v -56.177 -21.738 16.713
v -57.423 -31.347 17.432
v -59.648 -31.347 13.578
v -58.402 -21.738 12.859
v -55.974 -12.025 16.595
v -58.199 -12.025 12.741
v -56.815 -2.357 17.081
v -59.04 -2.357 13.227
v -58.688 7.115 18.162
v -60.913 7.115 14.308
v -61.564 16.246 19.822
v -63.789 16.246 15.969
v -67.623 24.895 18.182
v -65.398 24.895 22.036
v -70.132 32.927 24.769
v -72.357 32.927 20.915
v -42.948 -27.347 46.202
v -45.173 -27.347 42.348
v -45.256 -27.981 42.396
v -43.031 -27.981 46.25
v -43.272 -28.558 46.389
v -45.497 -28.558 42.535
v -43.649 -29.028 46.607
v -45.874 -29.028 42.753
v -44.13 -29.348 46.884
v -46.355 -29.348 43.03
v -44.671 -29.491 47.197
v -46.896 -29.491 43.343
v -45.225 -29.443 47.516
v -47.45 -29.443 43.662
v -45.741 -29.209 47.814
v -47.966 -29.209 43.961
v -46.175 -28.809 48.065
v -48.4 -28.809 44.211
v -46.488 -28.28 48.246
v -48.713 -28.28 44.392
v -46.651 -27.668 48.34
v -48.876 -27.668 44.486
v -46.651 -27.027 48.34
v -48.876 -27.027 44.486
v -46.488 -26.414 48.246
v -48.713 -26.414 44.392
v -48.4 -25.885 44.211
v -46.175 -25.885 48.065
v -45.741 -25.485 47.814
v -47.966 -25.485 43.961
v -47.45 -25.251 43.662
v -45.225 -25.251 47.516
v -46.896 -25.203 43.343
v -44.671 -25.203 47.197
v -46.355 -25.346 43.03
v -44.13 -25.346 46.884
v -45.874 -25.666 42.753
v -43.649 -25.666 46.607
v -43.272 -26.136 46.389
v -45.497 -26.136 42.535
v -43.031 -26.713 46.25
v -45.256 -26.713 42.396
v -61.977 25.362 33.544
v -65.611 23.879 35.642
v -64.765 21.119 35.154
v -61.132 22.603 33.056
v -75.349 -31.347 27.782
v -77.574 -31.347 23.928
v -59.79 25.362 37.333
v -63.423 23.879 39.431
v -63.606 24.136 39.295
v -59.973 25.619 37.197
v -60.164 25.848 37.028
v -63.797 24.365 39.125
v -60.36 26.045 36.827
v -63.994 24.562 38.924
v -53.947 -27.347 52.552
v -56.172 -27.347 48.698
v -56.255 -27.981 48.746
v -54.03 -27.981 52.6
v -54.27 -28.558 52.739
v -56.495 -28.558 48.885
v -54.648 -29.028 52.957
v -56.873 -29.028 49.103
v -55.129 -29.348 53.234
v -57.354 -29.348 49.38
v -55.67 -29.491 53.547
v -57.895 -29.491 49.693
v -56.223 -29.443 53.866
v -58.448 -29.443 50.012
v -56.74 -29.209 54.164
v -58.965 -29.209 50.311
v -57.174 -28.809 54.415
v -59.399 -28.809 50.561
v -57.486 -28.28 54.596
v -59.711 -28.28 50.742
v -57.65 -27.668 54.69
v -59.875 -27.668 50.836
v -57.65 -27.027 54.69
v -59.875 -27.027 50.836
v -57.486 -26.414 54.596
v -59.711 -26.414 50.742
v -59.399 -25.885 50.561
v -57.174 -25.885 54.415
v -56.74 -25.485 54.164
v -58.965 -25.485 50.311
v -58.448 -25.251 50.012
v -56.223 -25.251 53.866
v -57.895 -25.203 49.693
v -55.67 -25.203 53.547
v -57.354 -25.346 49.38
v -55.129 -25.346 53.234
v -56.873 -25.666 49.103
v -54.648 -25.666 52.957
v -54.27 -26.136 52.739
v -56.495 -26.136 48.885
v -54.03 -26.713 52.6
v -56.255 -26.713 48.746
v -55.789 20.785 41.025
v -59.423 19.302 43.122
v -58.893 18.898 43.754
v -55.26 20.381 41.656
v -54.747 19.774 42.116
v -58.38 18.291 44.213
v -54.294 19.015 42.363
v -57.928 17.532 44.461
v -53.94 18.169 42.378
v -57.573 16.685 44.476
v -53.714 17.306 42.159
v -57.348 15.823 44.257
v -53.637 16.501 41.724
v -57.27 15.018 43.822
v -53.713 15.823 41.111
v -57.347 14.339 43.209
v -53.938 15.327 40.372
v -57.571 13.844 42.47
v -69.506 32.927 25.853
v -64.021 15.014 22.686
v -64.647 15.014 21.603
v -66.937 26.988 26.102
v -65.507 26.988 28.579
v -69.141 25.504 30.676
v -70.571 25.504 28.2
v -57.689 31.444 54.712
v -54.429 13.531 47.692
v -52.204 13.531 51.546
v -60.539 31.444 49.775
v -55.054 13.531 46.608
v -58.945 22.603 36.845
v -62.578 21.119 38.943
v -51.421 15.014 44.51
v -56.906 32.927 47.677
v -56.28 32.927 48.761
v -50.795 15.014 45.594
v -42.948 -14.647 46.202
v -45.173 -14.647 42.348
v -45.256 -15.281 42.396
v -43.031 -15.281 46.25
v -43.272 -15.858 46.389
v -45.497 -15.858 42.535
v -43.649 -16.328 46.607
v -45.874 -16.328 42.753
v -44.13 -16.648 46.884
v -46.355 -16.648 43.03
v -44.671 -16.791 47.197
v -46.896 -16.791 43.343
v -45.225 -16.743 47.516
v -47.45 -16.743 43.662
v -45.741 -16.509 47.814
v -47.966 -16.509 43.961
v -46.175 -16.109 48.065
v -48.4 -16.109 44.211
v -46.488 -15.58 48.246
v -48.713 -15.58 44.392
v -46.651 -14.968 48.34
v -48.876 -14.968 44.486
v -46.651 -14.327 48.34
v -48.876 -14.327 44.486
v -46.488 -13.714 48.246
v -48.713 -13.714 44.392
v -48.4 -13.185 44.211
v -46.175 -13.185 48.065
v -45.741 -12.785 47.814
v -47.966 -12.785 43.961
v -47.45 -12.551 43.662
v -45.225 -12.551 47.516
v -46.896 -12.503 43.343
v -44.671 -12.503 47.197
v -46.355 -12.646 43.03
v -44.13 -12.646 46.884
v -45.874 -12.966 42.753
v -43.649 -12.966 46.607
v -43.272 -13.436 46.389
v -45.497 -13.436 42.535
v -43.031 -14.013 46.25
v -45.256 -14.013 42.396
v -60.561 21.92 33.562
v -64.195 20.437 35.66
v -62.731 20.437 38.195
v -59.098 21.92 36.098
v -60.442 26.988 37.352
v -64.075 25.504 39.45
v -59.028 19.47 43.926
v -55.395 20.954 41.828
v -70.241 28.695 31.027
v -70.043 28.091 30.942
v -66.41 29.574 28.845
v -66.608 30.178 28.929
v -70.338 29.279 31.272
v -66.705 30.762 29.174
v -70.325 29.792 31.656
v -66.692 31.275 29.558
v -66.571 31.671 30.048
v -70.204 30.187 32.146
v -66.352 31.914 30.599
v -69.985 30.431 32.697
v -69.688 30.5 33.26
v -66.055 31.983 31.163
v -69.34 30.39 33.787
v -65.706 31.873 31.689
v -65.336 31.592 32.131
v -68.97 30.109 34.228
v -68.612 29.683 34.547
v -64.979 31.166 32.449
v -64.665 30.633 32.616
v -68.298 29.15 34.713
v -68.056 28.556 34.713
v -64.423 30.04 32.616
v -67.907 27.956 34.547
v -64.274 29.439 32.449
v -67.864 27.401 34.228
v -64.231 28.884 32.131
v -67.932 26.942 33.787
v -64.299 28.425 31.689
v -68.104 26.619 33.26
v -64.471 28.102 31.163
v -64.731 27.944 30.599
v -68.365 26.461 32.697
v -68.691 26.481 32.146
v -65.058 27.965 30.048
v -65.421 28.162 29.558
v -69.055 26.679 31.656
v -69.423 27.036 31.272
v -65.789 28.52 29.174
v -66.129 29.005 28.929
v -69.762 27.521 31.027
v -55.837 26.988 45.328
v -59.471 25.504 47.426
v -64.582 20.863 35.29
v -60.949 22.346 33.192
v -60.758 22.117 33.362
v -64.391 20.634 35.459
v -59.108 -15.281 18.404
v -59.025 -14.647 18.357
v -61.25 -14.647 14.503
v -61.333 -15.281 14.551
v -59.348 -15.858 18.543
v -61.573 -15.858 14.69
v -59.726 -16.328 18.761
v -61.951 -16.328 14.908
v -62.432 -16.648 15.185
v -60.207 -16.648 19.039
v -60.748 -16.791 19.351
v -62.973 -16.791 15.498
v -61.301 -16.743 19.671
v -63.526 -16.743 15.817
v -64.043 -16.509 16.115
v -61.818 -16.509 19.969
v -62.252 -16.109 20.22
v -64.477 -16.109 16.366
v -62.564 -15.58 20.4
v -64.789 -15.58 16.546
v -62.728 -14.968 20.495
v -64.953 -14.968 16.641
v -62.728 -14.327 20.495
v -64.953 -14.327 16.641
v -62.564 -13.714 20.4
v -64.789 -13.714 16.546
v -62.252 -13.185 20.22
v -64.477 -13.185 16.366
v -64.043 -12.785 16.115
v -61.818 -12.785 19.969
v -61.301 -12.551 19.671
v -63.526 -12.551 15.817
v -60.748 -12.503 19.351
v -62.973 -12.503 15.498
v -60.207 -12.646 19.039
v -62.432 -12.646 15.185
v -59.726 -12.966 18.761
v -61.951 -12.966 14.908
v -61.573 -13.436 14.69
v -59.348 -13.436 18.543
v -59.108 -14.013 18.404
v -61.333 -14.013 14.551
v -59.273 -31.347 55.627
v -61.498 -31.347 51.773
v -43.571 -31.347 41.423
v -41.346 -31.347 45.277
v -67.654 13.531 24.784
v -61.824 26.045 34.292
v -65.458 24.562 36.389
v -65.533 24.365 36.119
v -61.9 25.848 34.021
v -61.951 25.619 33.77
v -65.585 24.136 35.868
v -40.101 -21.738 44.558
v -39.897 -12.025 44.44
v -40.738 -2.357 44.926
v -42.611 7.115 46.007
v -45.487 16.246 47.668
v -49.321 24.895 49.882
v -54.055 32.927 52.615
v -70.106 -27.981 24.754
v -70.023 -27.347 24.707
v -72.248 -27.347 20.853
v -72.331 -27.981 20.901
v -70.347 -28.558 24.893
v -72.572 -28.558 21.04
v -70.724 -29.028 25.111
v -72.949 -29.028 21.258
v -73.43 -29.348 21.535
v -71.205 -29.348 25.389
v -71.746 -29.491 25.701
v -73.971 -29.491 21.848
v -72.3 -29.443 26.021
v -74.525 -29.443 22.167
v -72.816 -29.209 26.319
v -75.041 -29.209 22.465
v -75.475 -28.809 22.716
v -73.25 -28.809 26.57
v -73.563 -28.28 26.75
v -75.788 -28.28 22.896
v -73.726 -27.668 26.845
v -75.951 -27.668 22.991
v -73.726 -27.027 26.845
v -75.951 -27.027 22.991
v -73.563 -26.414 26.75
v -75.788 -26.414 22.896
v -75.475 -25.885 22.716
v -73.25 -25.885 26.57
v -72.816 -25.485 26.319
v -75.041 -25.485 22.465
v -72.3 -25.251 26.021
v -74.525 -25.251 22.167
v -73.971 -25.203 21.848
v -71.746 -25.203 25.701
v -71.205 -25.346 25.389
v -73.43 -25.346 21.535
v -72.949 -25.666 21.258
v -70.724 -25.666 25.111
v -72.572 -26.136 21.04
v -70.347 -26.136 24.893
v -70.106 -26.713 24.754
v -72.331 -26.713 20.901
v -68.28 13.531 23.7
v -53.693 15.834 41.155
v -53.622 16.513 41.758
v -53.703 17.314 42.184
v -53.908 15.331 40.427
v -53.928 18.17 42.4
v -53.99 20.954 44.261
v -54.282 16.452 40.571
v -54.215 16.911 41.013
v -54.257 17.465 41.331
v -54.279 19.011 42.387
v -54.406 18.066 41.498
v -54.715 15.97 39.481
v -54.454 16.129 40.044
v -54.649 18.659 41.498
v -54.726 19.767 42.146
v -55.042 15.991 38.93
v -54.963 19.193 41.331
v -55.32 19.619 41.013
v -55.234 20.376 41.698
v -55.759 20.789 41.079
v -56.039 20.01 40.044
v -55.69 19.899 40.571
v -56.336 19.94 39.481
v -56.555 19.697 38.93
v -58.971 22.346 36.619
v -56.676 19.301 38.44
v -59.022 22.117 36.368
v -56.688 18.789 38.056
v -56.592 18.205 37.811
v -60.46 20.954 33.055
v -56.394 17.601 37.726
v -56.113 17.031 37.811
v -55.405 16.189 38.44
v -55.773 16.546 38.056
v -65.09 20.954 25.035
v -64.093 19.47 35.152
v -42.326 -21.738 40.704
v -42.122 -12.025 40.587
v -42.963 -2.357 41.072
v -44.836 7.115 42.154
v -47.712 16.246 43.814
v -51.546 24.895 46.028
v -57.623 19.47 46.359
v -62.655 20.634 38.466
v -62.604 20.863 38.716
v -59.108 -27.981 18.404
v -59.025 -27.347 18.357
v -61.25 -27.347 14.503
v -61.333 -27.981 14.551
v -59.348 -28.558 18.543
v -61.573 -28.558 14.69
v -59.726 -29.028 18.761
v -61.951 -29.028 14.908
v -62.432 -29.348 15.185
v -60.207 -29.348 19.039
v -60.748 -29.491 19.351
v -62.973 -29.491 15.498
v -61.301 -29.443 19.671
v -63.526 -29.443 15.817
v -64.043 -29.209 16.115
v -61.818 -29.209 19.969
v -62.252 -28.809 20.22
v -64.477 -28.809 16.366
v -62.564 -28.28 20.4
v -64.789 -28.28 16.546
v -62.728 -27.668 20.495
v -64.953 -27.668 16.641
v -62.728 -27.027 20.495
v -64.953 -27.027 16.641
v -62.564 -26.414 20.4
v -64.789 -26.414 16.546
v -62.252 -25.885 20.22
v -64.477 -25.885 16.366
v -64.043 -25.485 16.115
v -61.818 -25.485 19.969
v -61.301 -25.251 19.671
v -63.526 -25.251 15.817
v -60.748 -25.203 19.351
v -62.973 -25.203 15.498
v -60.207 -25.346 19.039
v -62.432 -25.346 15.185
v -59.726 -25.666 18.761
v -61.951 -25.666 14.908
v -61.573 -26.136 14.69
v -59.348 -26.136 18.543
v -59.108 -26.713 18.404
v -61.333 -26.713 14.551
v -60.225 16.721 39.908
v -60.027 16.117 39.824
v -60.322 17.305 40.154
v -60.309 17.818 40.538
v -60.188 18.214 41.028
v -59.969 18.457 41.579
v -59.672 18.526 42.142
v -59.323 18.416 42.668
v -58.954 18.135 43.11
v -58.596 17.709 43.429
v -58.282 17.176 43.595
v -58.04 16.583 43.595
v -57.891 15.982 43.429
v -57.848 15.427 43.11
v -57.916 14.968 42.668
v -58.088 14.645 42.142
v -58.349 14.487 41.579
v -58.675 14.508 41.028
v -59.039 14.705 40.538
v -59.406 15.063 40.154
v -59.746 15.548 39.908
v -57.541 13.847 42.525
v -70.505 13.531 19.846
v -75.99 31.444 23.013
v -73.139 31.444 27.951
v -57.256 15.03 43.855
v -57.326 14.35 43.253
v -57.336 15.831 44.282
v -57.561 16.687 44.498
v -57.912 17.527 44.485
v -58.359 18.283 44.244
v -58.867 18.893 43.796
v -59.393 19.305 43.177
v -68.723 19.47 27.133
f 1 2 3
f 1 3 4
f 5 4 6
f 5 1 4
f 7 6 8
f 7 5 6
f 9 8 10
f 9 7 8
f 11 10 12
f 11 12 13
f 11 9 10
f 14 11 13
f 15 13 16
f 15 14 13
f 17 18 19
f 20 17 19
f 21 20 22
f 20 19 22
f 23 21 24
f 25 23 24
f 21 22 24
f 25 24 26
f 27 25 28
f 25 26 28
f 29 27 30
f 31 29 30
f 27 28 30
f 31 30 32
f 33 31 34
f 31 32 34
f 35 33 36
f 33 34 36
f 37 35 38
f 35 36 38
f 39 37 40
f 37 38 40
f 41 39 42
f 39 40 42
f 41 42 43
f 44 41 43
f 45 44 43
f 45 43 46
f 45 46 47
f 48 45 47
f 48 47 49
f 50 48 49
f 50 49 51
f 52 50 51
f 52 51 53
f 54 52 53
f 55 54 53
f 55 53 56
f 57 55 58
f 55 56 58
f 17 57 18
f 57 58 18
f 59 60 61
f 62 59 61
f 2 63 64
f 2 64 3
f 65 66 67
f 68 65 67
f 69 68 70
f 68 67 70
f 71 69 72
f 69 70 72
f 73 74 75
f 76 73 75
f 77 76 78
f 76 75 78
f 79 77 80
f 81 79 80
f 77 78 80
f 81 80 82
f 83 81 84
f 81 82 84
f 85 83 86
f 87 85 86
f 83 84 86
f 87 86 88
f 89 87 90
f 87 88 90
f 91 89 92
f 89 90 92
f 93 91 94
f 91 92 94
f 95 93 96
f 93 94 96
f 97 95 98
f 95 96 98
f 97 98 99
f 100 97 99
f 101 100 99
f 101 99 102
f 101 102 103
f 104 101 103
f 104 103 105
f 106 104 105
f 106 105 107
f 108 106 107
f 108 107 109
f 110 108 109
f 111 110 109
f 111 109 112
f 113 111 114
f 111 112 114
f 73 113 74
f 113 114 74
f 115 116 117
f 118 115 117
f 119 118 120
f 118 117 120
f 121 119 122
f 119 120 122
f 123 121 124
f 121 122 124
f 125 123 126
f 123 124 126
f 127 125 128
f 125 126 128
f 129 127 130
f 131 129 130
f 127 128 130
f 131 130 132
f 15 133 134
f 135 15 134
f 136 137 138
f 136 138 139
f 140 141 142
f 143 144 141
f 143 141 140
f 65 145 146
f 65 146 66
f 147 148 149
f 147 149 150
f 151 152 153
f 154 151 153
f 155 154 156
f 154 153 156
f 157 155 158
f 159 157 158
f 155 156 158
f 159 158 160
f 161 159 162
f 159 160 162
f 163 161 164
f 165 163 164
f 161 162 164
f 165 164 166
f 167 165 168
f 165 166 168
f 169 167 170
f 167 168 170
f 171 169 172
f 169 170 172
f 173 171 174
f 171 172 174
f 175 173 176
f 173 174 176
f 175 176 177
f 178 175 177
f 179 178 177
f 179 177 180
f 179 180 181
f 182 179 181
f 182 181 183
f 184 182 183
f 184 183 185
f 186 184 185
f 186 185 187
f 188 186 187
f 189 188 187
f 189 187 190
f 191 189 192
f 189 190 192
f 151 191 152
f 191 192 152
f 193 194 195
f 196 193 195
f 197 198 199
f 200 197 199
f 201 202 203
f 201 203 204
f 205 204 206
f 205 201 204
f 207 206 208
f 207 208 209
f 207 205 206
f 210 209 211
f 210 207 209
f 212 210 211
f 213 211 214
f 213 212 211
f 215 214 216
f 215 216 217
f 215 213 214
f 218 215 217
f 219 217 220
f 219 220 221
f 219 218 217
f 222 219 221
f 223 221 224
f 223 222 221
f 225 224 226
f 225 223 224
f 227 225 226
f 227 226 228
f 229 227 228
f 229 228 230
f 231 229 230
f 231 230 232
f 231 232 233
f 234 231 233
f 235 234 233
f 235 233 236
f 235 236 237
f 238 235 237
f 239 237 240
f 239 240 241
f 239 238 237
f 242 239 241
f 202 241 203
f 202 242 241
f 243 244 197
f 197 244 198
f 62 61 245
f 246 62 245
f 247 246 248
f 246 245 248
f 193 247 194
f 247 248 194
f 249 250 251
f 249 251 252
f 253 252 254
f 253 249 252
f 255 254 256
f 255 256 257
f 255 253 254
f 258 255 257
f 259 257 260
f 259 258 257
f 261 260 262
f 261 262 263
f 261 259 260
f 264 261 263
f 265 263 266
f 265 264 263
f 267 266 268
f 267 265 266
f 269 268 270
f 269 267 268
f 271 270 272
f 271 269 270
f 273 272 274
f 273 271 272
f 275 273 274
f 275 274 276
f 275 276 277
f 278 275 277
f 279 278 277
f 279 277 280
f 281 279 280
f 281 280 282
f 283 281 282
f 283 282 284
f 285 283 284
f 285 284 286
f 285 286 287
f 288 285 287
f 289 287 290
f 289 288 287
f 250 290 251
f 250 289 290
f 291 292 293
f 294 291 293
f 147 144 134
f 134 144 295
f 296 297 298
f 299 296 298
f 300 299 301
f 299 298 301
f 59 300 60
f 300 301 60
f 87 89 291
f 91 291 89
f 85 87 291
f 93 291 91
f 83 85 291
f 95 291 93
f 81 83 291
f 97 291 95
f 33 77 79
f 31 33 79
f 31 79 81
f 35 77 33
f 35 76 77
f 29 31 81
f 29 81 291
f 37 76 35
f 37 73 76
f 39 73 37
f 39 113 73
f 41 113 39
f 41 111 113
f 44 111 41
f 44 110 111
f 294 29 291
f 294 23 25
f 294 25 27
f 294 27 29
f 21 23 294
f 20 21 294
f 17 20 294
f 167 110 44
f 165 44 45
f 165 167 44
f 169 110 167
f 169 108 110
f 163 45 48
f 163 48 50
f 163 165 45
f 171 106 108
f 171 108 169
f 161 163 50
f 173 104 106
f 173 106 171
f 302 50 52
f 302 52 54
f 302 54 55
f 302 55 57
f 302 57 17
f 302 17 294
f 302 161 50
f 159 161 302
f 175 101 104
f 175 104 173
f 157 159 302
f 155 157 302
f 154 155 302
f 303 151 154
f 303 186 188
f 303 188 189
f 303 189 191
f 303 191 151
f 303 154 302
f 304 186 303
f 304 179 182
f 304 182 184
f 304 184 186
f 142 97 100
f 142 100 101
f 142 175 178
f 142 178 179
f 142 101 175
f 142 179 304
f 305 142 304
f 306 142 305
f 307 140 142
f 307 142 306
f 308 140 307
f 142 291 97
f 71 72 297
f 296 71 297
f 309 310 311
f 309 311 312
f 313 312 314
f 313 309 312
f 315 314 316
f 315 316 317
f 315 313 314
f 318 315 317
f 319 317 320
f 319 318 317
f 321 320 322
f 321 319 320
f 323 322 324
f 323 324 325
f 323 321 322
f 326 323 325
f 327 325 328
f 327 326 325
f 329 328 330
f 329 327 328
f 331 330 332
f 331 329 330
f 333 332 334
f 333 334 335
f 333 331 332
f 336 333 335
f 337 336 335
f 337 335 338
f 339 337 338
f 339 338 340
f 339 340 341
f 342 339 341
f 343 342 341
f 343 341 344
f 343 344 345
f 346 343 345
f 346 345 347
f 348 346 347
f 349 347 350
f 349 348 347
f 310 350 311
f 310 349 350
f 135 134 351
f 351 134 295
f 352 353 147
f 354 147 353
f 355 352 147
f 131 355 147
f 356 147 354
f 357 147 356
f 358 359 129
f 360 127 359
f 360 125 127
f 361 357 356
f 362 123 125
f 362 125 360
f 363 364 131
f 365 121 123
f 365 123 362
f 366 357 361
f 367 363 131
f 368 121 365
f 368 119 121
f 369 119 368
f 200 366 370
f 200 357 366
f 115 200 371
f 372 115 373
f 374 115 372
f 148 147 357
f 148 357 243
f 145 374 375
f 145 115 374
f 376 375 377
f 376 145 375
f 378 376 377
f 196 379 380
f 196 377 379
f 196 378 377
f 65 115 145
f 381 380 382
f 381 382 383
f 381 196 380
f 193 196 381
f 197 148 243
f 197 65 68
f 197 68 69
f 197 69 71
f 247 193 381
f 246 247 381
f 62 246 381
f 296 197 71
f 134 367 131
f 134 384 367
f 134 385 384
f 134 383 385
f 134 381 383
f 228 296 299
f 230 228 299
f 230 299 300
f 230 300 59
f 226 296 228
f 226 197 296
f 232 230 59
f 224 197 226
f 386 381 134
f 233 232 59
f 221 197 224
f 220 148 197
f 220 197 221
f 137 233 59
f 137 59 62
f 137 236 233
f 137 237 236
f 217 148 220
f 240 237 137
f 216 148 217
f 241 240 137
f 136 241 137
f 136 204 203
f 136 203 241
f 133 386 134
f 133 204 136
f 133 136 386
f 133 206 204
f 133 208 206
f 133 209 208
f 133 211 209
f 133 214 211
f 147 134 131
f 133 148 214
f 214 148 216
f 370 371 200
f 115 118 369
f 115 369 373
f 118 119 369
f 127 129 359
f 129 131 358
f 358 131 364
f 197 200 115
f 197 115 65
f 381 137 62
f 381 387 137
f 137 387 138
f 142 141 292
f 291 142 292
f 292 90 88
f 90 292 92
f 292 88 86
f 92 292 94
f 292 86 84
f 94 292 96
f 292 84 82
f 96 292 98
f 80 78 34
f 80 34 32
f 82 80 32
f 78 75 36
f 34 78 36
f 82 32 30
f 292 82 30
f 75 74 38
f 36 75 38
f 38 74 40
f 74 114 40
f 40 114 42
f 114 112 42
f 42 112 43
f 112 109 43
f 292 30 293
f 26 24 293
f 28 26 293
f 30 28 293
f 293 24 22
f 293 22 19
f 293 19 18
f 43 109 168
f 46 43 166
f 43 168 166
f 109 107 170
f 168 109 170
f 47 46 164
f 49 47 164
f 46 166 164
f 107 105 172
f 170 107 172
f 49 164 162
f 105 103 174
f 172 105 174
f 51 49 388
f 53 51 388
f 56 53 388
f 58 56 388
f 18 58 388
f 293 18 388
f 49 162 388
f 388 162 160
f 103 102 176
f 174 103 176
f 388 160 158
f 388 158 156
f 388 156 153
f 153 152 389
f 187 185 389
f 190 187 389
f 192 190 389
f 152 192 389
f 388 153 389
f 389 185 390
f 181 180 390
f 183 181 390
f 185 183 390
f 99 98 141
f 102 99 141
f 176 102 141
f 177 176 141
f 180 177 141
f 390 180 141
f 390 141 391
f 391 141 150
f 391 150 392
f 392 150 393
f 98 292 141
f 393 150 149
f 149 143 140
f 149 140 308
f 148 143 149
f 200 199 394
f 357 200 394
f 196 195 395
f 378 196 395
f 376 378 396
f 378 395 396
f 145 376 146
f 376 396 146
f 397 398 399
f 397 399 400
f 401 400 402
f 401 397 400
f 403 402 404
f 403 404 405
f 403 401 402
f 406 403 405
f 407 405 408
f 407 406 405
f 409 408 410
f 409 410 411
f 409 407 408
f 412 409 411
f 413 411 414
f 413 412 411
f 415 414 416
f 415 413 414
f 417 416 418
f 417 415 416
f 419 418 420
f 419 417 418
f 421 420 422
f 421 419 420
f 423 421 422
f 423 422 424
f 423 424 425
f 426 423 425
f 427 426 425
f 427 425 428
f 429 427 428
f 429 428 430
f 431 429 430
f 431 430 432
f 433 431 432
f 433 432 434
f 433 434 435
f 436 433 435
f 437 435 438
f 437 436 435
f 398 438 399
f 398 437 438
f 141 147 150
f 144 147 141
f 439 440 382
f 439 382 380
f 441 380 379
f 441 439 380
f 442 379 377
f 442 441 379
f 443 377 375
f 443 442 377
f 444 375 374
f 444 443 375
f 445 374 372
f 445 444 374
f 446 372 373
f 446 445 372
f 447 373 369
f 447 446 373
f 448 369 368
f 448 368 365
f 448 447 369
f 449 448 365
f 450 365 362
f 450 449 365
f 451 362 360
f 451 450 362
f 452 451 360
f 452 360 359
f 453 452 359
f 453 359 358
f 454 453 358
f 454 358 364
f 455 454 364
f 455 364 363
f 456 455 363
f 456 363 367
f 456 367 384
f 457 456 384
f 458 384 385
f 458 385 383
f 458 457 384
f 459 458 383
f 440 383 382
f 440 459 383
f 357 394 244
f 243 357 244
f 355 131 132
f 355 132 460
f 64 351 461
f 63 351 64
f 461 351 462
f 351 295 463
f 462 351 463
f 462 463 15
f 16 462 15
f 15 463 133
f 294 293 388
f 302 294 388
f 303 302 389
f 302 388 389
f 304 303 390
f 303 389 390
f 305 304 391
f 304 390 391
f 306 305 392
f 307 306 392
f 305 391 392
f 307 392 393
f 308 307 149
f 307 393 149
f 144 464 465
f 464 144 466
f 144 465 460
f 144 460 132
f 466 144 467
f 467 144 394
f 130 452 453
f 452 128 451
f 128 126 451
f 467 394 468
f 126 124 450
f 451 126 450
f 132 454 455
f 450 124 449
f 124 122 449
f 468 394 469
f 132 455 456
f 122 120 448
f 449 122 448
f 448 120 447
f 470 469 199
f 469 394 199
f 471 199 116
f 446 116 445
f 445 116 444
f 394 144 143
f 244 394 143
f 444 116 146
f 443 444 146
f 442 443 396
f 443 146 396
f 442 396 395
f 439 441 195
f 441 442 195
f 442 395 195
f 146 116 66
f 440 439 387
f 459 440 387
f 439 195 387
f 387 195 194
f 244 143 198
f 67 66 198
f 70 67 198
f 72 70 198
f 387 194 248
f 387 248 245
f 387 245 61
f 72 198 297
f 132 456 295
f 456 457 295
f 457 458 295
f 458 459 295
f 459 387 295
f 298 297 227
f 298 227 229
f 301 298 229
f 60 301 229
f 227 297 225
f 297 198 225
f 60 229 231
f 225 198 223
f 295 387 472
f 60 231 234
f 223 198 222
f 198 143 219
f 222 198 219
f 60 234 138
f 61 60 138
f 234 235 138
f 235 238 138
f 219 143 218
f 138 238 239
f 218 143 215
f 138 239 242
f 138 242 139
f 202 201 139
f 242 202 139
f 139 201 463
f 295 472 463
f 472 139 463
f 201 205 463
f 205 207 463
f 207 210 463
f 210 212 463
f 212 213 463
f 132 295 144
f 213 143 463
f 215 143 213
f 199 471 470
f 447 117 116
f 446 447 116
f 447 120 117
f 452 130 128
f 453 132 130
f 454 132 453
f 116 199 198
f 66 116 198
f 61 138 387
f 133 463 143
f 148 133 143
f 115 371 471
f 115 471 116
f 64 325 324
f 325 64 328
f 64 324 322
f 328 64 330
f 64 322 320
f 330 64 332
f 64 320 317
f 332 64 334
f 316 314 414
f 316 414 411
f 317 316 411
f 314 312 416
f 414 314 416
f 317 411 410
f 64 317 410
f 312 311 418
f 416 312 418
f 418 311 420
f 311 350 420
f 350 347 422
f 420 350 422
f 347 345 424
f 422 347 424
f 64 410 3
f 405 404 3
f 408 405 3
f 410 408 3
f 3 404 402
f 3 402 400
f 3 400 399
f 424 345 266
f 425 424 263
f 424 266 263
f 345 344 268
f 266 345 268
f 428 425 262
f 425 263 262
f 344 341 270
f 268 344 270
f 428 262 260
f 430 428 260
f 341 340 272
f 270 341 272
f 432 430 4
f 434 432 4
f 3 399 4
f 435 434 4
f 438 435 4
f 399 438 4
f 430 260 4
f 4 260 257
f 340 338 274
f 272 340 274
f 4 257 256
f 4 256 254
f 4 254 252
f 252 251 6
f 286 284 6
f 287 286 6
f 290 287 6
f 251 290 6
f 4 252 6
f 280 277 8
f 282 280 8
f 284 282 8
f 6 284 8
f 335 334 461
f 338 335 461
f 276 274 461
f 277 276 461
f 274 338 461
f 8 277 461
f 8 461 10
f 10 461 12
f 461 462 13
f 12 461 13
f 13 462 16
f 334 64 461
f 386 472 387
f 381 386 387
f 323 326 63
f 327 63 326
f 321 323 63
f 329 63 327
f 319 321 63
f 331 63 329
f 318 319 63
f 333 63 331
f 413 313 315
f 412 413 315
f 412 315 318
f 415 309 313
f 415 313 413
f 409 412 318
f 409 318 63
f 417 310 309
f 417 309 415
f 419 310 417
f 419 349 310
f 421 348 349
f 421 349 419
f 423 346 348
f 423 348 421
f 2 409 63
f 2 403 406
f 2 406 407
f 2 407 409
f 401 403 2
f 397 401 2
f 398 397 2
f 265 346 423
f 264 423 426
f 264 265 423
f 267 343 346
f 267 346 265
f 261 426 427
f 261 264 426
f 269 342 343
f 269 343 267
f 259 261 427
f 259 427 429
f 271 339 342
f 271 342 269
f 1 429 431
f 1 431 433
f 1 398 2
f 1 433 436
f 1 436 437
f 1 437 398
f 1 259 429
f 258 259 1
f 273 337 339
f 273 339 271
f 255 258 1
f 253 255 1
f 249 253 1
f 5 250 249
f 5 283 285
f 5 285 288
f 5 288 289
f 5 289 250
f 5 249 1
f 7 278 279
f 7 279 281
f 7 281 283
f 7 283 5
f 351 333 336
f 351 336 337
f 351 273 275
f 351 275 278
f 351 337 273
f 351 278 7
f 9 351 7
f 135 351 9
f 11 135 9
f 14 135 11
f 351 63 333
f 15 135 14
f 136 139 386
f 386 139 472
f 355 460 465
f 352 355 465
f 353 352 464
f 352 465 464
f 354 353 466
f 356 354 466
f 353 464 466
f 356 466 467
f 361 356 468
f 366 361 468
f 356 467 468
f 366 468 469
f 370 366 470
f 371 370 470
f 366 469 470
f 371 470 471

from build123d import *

# Parameters (mm, degrees)
BOSS_EXTRUDE1_OUTLINE_R = 2.15
BOSS_EXTRUDE1_DEPTH     = 4.45
BOSS_EXTRUDE2_START     = 1.2515
SKETCH2_R               = 2.15
BOSS_EXTRUDE2_DEPTH     = 4.45
BOSS_EXTRUDE3_DEPTH     = 1.251499962


# Read off the part's stored shape, not the designer's step: Boss-Extrude1
with BuildPart() as part:
    # Boss-Extrude1 outline → Boss-Extrude1 (new body)
    with BuildSketch(Plane(origin=(-50.959815044, -20.804257374, 29.421662933), x_dir=(-0.4364357804719844, -0.17817416127494956, -0.8819171036881971), z_dir=(0.8164965809277264, 0.3333333333333333, -0.4714045207910314))):
        Polygon((-19.487444888, 33.335644756), (5.258463865, 38.097997116), (1.667801371, 56.755626731), (-23.078107381, 51.993274371), align=None)
        with BuildLine():
            ThreePointArc((-14.857414364, 34.568841104), (-17.094425047, 37.205029513), (-15.59724376, 40.32146246))
            Line((-15.59724376, 40.32146246), (-15.535066644, 40.329458894))
            ThreePointArc((-15.535066644, 40.329458894), (-17.069629265, 37.208218432), (-14.795237248, 34.576837538))
            Line((-14.795237248, 34.576837538), (-14.857414364, 34.568841104))
        make_face(mode=Mode.SUBTRACT)
        with Locations((-13.94536077, 37.610022328)):
            Circle(BOSS_EXTRUDE1_OUTLINE_R, mode=Mode.SUBTRACT)
        Polygon((-11.370861729, 47.830728875), (-16.446050654, 40.336567322), (-19.205062219, 39.805595299), (-20.414548532, 46.090270538), align=None, mode=Mode.SUBTRACT)
        with BuildLine():
            Line((-10.795931949, 43.204869293), (-11.349147903, 46.079416754))
            ThreePointArc((-11.349147903, 46.079416754), (-11.103747968, 46.531394654), (-10.775137708, 46.927021304))
            Line((-10.775137708, 46.927021304), (-7.900590246, 47.480237259))
            ThreePointArc((-7.900590246, 47.480237259), (-7.448612347, 47.234837323), (-7.052985696, 46.906227063))
            Line((-7.052985696, 46.906227063), (-6.499769742, 44.031679602))
            ThreePointArc((-6.499769742, 44.031679602), (-6.745169677, 43.579701702), (-7.073779937, 43.184075051))
            Line((-7.073779937, 43.184075051), (-9.948327399, 42.630859097))
            ThreePointArc((-9.948327399, 42.630859097), (-10.400305299, 42.876259032), (-10.795931949, 43.204869293))
        make_face(mode=Mode.SUBTRACT)
        Polygon((-1.422691887, 49.745255053), (1.385418702, 50.285676188), (2.594905016, 44.00100095), (-6.497880812, 42.251093501), align=None, mode=Mode.SUBTRACT)
        with Locations((-3.874282746, 52.481249159)):
            Circle(BOSS_EXTRUDE1_OUTLINE_R, mode=Mode.SUBTRACT)
    extrude(amount=BOSS_EXTRUDE1_DEPTH)


with BuildPart() as body_2:
    # Sketch2 → Boss-Extrude2 (new body)
    with BuildSketch(Plane(origin=(-6.181776854, 0, -10.707151593), x_dir=(-0.866025403784439, 0, 0.4999999999999995), z_dir=(-0.49999999999999944, 0, -0.8660254037844389)).offset(BOSS_EXTRUDE2_START)):
        with BuildLine():
            Line((70.982570609, 13.530711728), (79.145309345, -31.347065587))
            Line((79.145309345, -31.347065587), (58.445309345, -31.347065587))
            ThreePointArc((58.445309345, -31.347065587), (58.677489694, 2.412466855), (73.120403707, 32.927416852))
            Line((73.120403707, 32.927416852), (77.315903942, 31.444083519))
            Line((77.315903942, 31.444083519), (70.982570609, 13.530711728))
        make_face()
        with Locations(Location((62.445309345, -27.347065587, 0), (0, 0, 180))):
            Circle(SKETCH2_R, mode=Mode.SUBTRACT)
        with Locations(Location((62.445309345, -14.647065587, 0), (0, 0, 180))):
            Circle(SKETCH2_R, mode=Mode.SUBTRACT)
        with Locations(Location((75.145309345, -27.347065587, 0), (0, 0, 180))):
            Circle(SKETCH2_R, mode=Mode.SUBTRACT)
    extrude(amount=BOSS_EXTRUDE2_DEPTH)


with BuildPart() as body_3:
    # Sketch4 → Boss-Extrude3 (new body)
    with BuildSketch(Plane(origin=(-6.181776854, 0, -10.707151593), x_dir=(-0.866025403784439, 0, 0.4999999999999995), z_dir=(-0.49999999999999944, 0, -0.8660254037844389))):
        Polygon((70.982570609, 13.530711728), (77.315903942, 31.444083519), (73.120403707, 32.927416852), (66.787070374, 15.014045062), align=None)
    extrude(amount=BOSS_EXTRUDE3_DEPTH)


with BuildPart() as body_4:
    # Mirror1: mirrored copy
    add(body_2.part.mirror(Plane(origin=(0.118223146, 0, 0.204768495), x_dir=(-0.8660254037844389, 0, 0.49999999999999967), z_dir=(0.49999999999999944, 0, 0.8660254037844389))))


with BuildPart() as body_5:
    # Mirror1 2: mirrored copy
    add(body_3.part.mirror(Plane(origin=(0.118223146, 0, 0.204768495), x_dir=(-0.8660254037844389, 0, 0.49999999999999967), z_dir=(0.49999999999999944, 0, 0.8660254037844389))))


with BuildPart() as body_2_1:
    add(body_2.part)

    # Combine1: union body 3, body 4, body 5, part
    add(body_3.part)
    add(body_4.part)
    add(body_5.part)
    add(part.part)


solid = body_2_1.part
